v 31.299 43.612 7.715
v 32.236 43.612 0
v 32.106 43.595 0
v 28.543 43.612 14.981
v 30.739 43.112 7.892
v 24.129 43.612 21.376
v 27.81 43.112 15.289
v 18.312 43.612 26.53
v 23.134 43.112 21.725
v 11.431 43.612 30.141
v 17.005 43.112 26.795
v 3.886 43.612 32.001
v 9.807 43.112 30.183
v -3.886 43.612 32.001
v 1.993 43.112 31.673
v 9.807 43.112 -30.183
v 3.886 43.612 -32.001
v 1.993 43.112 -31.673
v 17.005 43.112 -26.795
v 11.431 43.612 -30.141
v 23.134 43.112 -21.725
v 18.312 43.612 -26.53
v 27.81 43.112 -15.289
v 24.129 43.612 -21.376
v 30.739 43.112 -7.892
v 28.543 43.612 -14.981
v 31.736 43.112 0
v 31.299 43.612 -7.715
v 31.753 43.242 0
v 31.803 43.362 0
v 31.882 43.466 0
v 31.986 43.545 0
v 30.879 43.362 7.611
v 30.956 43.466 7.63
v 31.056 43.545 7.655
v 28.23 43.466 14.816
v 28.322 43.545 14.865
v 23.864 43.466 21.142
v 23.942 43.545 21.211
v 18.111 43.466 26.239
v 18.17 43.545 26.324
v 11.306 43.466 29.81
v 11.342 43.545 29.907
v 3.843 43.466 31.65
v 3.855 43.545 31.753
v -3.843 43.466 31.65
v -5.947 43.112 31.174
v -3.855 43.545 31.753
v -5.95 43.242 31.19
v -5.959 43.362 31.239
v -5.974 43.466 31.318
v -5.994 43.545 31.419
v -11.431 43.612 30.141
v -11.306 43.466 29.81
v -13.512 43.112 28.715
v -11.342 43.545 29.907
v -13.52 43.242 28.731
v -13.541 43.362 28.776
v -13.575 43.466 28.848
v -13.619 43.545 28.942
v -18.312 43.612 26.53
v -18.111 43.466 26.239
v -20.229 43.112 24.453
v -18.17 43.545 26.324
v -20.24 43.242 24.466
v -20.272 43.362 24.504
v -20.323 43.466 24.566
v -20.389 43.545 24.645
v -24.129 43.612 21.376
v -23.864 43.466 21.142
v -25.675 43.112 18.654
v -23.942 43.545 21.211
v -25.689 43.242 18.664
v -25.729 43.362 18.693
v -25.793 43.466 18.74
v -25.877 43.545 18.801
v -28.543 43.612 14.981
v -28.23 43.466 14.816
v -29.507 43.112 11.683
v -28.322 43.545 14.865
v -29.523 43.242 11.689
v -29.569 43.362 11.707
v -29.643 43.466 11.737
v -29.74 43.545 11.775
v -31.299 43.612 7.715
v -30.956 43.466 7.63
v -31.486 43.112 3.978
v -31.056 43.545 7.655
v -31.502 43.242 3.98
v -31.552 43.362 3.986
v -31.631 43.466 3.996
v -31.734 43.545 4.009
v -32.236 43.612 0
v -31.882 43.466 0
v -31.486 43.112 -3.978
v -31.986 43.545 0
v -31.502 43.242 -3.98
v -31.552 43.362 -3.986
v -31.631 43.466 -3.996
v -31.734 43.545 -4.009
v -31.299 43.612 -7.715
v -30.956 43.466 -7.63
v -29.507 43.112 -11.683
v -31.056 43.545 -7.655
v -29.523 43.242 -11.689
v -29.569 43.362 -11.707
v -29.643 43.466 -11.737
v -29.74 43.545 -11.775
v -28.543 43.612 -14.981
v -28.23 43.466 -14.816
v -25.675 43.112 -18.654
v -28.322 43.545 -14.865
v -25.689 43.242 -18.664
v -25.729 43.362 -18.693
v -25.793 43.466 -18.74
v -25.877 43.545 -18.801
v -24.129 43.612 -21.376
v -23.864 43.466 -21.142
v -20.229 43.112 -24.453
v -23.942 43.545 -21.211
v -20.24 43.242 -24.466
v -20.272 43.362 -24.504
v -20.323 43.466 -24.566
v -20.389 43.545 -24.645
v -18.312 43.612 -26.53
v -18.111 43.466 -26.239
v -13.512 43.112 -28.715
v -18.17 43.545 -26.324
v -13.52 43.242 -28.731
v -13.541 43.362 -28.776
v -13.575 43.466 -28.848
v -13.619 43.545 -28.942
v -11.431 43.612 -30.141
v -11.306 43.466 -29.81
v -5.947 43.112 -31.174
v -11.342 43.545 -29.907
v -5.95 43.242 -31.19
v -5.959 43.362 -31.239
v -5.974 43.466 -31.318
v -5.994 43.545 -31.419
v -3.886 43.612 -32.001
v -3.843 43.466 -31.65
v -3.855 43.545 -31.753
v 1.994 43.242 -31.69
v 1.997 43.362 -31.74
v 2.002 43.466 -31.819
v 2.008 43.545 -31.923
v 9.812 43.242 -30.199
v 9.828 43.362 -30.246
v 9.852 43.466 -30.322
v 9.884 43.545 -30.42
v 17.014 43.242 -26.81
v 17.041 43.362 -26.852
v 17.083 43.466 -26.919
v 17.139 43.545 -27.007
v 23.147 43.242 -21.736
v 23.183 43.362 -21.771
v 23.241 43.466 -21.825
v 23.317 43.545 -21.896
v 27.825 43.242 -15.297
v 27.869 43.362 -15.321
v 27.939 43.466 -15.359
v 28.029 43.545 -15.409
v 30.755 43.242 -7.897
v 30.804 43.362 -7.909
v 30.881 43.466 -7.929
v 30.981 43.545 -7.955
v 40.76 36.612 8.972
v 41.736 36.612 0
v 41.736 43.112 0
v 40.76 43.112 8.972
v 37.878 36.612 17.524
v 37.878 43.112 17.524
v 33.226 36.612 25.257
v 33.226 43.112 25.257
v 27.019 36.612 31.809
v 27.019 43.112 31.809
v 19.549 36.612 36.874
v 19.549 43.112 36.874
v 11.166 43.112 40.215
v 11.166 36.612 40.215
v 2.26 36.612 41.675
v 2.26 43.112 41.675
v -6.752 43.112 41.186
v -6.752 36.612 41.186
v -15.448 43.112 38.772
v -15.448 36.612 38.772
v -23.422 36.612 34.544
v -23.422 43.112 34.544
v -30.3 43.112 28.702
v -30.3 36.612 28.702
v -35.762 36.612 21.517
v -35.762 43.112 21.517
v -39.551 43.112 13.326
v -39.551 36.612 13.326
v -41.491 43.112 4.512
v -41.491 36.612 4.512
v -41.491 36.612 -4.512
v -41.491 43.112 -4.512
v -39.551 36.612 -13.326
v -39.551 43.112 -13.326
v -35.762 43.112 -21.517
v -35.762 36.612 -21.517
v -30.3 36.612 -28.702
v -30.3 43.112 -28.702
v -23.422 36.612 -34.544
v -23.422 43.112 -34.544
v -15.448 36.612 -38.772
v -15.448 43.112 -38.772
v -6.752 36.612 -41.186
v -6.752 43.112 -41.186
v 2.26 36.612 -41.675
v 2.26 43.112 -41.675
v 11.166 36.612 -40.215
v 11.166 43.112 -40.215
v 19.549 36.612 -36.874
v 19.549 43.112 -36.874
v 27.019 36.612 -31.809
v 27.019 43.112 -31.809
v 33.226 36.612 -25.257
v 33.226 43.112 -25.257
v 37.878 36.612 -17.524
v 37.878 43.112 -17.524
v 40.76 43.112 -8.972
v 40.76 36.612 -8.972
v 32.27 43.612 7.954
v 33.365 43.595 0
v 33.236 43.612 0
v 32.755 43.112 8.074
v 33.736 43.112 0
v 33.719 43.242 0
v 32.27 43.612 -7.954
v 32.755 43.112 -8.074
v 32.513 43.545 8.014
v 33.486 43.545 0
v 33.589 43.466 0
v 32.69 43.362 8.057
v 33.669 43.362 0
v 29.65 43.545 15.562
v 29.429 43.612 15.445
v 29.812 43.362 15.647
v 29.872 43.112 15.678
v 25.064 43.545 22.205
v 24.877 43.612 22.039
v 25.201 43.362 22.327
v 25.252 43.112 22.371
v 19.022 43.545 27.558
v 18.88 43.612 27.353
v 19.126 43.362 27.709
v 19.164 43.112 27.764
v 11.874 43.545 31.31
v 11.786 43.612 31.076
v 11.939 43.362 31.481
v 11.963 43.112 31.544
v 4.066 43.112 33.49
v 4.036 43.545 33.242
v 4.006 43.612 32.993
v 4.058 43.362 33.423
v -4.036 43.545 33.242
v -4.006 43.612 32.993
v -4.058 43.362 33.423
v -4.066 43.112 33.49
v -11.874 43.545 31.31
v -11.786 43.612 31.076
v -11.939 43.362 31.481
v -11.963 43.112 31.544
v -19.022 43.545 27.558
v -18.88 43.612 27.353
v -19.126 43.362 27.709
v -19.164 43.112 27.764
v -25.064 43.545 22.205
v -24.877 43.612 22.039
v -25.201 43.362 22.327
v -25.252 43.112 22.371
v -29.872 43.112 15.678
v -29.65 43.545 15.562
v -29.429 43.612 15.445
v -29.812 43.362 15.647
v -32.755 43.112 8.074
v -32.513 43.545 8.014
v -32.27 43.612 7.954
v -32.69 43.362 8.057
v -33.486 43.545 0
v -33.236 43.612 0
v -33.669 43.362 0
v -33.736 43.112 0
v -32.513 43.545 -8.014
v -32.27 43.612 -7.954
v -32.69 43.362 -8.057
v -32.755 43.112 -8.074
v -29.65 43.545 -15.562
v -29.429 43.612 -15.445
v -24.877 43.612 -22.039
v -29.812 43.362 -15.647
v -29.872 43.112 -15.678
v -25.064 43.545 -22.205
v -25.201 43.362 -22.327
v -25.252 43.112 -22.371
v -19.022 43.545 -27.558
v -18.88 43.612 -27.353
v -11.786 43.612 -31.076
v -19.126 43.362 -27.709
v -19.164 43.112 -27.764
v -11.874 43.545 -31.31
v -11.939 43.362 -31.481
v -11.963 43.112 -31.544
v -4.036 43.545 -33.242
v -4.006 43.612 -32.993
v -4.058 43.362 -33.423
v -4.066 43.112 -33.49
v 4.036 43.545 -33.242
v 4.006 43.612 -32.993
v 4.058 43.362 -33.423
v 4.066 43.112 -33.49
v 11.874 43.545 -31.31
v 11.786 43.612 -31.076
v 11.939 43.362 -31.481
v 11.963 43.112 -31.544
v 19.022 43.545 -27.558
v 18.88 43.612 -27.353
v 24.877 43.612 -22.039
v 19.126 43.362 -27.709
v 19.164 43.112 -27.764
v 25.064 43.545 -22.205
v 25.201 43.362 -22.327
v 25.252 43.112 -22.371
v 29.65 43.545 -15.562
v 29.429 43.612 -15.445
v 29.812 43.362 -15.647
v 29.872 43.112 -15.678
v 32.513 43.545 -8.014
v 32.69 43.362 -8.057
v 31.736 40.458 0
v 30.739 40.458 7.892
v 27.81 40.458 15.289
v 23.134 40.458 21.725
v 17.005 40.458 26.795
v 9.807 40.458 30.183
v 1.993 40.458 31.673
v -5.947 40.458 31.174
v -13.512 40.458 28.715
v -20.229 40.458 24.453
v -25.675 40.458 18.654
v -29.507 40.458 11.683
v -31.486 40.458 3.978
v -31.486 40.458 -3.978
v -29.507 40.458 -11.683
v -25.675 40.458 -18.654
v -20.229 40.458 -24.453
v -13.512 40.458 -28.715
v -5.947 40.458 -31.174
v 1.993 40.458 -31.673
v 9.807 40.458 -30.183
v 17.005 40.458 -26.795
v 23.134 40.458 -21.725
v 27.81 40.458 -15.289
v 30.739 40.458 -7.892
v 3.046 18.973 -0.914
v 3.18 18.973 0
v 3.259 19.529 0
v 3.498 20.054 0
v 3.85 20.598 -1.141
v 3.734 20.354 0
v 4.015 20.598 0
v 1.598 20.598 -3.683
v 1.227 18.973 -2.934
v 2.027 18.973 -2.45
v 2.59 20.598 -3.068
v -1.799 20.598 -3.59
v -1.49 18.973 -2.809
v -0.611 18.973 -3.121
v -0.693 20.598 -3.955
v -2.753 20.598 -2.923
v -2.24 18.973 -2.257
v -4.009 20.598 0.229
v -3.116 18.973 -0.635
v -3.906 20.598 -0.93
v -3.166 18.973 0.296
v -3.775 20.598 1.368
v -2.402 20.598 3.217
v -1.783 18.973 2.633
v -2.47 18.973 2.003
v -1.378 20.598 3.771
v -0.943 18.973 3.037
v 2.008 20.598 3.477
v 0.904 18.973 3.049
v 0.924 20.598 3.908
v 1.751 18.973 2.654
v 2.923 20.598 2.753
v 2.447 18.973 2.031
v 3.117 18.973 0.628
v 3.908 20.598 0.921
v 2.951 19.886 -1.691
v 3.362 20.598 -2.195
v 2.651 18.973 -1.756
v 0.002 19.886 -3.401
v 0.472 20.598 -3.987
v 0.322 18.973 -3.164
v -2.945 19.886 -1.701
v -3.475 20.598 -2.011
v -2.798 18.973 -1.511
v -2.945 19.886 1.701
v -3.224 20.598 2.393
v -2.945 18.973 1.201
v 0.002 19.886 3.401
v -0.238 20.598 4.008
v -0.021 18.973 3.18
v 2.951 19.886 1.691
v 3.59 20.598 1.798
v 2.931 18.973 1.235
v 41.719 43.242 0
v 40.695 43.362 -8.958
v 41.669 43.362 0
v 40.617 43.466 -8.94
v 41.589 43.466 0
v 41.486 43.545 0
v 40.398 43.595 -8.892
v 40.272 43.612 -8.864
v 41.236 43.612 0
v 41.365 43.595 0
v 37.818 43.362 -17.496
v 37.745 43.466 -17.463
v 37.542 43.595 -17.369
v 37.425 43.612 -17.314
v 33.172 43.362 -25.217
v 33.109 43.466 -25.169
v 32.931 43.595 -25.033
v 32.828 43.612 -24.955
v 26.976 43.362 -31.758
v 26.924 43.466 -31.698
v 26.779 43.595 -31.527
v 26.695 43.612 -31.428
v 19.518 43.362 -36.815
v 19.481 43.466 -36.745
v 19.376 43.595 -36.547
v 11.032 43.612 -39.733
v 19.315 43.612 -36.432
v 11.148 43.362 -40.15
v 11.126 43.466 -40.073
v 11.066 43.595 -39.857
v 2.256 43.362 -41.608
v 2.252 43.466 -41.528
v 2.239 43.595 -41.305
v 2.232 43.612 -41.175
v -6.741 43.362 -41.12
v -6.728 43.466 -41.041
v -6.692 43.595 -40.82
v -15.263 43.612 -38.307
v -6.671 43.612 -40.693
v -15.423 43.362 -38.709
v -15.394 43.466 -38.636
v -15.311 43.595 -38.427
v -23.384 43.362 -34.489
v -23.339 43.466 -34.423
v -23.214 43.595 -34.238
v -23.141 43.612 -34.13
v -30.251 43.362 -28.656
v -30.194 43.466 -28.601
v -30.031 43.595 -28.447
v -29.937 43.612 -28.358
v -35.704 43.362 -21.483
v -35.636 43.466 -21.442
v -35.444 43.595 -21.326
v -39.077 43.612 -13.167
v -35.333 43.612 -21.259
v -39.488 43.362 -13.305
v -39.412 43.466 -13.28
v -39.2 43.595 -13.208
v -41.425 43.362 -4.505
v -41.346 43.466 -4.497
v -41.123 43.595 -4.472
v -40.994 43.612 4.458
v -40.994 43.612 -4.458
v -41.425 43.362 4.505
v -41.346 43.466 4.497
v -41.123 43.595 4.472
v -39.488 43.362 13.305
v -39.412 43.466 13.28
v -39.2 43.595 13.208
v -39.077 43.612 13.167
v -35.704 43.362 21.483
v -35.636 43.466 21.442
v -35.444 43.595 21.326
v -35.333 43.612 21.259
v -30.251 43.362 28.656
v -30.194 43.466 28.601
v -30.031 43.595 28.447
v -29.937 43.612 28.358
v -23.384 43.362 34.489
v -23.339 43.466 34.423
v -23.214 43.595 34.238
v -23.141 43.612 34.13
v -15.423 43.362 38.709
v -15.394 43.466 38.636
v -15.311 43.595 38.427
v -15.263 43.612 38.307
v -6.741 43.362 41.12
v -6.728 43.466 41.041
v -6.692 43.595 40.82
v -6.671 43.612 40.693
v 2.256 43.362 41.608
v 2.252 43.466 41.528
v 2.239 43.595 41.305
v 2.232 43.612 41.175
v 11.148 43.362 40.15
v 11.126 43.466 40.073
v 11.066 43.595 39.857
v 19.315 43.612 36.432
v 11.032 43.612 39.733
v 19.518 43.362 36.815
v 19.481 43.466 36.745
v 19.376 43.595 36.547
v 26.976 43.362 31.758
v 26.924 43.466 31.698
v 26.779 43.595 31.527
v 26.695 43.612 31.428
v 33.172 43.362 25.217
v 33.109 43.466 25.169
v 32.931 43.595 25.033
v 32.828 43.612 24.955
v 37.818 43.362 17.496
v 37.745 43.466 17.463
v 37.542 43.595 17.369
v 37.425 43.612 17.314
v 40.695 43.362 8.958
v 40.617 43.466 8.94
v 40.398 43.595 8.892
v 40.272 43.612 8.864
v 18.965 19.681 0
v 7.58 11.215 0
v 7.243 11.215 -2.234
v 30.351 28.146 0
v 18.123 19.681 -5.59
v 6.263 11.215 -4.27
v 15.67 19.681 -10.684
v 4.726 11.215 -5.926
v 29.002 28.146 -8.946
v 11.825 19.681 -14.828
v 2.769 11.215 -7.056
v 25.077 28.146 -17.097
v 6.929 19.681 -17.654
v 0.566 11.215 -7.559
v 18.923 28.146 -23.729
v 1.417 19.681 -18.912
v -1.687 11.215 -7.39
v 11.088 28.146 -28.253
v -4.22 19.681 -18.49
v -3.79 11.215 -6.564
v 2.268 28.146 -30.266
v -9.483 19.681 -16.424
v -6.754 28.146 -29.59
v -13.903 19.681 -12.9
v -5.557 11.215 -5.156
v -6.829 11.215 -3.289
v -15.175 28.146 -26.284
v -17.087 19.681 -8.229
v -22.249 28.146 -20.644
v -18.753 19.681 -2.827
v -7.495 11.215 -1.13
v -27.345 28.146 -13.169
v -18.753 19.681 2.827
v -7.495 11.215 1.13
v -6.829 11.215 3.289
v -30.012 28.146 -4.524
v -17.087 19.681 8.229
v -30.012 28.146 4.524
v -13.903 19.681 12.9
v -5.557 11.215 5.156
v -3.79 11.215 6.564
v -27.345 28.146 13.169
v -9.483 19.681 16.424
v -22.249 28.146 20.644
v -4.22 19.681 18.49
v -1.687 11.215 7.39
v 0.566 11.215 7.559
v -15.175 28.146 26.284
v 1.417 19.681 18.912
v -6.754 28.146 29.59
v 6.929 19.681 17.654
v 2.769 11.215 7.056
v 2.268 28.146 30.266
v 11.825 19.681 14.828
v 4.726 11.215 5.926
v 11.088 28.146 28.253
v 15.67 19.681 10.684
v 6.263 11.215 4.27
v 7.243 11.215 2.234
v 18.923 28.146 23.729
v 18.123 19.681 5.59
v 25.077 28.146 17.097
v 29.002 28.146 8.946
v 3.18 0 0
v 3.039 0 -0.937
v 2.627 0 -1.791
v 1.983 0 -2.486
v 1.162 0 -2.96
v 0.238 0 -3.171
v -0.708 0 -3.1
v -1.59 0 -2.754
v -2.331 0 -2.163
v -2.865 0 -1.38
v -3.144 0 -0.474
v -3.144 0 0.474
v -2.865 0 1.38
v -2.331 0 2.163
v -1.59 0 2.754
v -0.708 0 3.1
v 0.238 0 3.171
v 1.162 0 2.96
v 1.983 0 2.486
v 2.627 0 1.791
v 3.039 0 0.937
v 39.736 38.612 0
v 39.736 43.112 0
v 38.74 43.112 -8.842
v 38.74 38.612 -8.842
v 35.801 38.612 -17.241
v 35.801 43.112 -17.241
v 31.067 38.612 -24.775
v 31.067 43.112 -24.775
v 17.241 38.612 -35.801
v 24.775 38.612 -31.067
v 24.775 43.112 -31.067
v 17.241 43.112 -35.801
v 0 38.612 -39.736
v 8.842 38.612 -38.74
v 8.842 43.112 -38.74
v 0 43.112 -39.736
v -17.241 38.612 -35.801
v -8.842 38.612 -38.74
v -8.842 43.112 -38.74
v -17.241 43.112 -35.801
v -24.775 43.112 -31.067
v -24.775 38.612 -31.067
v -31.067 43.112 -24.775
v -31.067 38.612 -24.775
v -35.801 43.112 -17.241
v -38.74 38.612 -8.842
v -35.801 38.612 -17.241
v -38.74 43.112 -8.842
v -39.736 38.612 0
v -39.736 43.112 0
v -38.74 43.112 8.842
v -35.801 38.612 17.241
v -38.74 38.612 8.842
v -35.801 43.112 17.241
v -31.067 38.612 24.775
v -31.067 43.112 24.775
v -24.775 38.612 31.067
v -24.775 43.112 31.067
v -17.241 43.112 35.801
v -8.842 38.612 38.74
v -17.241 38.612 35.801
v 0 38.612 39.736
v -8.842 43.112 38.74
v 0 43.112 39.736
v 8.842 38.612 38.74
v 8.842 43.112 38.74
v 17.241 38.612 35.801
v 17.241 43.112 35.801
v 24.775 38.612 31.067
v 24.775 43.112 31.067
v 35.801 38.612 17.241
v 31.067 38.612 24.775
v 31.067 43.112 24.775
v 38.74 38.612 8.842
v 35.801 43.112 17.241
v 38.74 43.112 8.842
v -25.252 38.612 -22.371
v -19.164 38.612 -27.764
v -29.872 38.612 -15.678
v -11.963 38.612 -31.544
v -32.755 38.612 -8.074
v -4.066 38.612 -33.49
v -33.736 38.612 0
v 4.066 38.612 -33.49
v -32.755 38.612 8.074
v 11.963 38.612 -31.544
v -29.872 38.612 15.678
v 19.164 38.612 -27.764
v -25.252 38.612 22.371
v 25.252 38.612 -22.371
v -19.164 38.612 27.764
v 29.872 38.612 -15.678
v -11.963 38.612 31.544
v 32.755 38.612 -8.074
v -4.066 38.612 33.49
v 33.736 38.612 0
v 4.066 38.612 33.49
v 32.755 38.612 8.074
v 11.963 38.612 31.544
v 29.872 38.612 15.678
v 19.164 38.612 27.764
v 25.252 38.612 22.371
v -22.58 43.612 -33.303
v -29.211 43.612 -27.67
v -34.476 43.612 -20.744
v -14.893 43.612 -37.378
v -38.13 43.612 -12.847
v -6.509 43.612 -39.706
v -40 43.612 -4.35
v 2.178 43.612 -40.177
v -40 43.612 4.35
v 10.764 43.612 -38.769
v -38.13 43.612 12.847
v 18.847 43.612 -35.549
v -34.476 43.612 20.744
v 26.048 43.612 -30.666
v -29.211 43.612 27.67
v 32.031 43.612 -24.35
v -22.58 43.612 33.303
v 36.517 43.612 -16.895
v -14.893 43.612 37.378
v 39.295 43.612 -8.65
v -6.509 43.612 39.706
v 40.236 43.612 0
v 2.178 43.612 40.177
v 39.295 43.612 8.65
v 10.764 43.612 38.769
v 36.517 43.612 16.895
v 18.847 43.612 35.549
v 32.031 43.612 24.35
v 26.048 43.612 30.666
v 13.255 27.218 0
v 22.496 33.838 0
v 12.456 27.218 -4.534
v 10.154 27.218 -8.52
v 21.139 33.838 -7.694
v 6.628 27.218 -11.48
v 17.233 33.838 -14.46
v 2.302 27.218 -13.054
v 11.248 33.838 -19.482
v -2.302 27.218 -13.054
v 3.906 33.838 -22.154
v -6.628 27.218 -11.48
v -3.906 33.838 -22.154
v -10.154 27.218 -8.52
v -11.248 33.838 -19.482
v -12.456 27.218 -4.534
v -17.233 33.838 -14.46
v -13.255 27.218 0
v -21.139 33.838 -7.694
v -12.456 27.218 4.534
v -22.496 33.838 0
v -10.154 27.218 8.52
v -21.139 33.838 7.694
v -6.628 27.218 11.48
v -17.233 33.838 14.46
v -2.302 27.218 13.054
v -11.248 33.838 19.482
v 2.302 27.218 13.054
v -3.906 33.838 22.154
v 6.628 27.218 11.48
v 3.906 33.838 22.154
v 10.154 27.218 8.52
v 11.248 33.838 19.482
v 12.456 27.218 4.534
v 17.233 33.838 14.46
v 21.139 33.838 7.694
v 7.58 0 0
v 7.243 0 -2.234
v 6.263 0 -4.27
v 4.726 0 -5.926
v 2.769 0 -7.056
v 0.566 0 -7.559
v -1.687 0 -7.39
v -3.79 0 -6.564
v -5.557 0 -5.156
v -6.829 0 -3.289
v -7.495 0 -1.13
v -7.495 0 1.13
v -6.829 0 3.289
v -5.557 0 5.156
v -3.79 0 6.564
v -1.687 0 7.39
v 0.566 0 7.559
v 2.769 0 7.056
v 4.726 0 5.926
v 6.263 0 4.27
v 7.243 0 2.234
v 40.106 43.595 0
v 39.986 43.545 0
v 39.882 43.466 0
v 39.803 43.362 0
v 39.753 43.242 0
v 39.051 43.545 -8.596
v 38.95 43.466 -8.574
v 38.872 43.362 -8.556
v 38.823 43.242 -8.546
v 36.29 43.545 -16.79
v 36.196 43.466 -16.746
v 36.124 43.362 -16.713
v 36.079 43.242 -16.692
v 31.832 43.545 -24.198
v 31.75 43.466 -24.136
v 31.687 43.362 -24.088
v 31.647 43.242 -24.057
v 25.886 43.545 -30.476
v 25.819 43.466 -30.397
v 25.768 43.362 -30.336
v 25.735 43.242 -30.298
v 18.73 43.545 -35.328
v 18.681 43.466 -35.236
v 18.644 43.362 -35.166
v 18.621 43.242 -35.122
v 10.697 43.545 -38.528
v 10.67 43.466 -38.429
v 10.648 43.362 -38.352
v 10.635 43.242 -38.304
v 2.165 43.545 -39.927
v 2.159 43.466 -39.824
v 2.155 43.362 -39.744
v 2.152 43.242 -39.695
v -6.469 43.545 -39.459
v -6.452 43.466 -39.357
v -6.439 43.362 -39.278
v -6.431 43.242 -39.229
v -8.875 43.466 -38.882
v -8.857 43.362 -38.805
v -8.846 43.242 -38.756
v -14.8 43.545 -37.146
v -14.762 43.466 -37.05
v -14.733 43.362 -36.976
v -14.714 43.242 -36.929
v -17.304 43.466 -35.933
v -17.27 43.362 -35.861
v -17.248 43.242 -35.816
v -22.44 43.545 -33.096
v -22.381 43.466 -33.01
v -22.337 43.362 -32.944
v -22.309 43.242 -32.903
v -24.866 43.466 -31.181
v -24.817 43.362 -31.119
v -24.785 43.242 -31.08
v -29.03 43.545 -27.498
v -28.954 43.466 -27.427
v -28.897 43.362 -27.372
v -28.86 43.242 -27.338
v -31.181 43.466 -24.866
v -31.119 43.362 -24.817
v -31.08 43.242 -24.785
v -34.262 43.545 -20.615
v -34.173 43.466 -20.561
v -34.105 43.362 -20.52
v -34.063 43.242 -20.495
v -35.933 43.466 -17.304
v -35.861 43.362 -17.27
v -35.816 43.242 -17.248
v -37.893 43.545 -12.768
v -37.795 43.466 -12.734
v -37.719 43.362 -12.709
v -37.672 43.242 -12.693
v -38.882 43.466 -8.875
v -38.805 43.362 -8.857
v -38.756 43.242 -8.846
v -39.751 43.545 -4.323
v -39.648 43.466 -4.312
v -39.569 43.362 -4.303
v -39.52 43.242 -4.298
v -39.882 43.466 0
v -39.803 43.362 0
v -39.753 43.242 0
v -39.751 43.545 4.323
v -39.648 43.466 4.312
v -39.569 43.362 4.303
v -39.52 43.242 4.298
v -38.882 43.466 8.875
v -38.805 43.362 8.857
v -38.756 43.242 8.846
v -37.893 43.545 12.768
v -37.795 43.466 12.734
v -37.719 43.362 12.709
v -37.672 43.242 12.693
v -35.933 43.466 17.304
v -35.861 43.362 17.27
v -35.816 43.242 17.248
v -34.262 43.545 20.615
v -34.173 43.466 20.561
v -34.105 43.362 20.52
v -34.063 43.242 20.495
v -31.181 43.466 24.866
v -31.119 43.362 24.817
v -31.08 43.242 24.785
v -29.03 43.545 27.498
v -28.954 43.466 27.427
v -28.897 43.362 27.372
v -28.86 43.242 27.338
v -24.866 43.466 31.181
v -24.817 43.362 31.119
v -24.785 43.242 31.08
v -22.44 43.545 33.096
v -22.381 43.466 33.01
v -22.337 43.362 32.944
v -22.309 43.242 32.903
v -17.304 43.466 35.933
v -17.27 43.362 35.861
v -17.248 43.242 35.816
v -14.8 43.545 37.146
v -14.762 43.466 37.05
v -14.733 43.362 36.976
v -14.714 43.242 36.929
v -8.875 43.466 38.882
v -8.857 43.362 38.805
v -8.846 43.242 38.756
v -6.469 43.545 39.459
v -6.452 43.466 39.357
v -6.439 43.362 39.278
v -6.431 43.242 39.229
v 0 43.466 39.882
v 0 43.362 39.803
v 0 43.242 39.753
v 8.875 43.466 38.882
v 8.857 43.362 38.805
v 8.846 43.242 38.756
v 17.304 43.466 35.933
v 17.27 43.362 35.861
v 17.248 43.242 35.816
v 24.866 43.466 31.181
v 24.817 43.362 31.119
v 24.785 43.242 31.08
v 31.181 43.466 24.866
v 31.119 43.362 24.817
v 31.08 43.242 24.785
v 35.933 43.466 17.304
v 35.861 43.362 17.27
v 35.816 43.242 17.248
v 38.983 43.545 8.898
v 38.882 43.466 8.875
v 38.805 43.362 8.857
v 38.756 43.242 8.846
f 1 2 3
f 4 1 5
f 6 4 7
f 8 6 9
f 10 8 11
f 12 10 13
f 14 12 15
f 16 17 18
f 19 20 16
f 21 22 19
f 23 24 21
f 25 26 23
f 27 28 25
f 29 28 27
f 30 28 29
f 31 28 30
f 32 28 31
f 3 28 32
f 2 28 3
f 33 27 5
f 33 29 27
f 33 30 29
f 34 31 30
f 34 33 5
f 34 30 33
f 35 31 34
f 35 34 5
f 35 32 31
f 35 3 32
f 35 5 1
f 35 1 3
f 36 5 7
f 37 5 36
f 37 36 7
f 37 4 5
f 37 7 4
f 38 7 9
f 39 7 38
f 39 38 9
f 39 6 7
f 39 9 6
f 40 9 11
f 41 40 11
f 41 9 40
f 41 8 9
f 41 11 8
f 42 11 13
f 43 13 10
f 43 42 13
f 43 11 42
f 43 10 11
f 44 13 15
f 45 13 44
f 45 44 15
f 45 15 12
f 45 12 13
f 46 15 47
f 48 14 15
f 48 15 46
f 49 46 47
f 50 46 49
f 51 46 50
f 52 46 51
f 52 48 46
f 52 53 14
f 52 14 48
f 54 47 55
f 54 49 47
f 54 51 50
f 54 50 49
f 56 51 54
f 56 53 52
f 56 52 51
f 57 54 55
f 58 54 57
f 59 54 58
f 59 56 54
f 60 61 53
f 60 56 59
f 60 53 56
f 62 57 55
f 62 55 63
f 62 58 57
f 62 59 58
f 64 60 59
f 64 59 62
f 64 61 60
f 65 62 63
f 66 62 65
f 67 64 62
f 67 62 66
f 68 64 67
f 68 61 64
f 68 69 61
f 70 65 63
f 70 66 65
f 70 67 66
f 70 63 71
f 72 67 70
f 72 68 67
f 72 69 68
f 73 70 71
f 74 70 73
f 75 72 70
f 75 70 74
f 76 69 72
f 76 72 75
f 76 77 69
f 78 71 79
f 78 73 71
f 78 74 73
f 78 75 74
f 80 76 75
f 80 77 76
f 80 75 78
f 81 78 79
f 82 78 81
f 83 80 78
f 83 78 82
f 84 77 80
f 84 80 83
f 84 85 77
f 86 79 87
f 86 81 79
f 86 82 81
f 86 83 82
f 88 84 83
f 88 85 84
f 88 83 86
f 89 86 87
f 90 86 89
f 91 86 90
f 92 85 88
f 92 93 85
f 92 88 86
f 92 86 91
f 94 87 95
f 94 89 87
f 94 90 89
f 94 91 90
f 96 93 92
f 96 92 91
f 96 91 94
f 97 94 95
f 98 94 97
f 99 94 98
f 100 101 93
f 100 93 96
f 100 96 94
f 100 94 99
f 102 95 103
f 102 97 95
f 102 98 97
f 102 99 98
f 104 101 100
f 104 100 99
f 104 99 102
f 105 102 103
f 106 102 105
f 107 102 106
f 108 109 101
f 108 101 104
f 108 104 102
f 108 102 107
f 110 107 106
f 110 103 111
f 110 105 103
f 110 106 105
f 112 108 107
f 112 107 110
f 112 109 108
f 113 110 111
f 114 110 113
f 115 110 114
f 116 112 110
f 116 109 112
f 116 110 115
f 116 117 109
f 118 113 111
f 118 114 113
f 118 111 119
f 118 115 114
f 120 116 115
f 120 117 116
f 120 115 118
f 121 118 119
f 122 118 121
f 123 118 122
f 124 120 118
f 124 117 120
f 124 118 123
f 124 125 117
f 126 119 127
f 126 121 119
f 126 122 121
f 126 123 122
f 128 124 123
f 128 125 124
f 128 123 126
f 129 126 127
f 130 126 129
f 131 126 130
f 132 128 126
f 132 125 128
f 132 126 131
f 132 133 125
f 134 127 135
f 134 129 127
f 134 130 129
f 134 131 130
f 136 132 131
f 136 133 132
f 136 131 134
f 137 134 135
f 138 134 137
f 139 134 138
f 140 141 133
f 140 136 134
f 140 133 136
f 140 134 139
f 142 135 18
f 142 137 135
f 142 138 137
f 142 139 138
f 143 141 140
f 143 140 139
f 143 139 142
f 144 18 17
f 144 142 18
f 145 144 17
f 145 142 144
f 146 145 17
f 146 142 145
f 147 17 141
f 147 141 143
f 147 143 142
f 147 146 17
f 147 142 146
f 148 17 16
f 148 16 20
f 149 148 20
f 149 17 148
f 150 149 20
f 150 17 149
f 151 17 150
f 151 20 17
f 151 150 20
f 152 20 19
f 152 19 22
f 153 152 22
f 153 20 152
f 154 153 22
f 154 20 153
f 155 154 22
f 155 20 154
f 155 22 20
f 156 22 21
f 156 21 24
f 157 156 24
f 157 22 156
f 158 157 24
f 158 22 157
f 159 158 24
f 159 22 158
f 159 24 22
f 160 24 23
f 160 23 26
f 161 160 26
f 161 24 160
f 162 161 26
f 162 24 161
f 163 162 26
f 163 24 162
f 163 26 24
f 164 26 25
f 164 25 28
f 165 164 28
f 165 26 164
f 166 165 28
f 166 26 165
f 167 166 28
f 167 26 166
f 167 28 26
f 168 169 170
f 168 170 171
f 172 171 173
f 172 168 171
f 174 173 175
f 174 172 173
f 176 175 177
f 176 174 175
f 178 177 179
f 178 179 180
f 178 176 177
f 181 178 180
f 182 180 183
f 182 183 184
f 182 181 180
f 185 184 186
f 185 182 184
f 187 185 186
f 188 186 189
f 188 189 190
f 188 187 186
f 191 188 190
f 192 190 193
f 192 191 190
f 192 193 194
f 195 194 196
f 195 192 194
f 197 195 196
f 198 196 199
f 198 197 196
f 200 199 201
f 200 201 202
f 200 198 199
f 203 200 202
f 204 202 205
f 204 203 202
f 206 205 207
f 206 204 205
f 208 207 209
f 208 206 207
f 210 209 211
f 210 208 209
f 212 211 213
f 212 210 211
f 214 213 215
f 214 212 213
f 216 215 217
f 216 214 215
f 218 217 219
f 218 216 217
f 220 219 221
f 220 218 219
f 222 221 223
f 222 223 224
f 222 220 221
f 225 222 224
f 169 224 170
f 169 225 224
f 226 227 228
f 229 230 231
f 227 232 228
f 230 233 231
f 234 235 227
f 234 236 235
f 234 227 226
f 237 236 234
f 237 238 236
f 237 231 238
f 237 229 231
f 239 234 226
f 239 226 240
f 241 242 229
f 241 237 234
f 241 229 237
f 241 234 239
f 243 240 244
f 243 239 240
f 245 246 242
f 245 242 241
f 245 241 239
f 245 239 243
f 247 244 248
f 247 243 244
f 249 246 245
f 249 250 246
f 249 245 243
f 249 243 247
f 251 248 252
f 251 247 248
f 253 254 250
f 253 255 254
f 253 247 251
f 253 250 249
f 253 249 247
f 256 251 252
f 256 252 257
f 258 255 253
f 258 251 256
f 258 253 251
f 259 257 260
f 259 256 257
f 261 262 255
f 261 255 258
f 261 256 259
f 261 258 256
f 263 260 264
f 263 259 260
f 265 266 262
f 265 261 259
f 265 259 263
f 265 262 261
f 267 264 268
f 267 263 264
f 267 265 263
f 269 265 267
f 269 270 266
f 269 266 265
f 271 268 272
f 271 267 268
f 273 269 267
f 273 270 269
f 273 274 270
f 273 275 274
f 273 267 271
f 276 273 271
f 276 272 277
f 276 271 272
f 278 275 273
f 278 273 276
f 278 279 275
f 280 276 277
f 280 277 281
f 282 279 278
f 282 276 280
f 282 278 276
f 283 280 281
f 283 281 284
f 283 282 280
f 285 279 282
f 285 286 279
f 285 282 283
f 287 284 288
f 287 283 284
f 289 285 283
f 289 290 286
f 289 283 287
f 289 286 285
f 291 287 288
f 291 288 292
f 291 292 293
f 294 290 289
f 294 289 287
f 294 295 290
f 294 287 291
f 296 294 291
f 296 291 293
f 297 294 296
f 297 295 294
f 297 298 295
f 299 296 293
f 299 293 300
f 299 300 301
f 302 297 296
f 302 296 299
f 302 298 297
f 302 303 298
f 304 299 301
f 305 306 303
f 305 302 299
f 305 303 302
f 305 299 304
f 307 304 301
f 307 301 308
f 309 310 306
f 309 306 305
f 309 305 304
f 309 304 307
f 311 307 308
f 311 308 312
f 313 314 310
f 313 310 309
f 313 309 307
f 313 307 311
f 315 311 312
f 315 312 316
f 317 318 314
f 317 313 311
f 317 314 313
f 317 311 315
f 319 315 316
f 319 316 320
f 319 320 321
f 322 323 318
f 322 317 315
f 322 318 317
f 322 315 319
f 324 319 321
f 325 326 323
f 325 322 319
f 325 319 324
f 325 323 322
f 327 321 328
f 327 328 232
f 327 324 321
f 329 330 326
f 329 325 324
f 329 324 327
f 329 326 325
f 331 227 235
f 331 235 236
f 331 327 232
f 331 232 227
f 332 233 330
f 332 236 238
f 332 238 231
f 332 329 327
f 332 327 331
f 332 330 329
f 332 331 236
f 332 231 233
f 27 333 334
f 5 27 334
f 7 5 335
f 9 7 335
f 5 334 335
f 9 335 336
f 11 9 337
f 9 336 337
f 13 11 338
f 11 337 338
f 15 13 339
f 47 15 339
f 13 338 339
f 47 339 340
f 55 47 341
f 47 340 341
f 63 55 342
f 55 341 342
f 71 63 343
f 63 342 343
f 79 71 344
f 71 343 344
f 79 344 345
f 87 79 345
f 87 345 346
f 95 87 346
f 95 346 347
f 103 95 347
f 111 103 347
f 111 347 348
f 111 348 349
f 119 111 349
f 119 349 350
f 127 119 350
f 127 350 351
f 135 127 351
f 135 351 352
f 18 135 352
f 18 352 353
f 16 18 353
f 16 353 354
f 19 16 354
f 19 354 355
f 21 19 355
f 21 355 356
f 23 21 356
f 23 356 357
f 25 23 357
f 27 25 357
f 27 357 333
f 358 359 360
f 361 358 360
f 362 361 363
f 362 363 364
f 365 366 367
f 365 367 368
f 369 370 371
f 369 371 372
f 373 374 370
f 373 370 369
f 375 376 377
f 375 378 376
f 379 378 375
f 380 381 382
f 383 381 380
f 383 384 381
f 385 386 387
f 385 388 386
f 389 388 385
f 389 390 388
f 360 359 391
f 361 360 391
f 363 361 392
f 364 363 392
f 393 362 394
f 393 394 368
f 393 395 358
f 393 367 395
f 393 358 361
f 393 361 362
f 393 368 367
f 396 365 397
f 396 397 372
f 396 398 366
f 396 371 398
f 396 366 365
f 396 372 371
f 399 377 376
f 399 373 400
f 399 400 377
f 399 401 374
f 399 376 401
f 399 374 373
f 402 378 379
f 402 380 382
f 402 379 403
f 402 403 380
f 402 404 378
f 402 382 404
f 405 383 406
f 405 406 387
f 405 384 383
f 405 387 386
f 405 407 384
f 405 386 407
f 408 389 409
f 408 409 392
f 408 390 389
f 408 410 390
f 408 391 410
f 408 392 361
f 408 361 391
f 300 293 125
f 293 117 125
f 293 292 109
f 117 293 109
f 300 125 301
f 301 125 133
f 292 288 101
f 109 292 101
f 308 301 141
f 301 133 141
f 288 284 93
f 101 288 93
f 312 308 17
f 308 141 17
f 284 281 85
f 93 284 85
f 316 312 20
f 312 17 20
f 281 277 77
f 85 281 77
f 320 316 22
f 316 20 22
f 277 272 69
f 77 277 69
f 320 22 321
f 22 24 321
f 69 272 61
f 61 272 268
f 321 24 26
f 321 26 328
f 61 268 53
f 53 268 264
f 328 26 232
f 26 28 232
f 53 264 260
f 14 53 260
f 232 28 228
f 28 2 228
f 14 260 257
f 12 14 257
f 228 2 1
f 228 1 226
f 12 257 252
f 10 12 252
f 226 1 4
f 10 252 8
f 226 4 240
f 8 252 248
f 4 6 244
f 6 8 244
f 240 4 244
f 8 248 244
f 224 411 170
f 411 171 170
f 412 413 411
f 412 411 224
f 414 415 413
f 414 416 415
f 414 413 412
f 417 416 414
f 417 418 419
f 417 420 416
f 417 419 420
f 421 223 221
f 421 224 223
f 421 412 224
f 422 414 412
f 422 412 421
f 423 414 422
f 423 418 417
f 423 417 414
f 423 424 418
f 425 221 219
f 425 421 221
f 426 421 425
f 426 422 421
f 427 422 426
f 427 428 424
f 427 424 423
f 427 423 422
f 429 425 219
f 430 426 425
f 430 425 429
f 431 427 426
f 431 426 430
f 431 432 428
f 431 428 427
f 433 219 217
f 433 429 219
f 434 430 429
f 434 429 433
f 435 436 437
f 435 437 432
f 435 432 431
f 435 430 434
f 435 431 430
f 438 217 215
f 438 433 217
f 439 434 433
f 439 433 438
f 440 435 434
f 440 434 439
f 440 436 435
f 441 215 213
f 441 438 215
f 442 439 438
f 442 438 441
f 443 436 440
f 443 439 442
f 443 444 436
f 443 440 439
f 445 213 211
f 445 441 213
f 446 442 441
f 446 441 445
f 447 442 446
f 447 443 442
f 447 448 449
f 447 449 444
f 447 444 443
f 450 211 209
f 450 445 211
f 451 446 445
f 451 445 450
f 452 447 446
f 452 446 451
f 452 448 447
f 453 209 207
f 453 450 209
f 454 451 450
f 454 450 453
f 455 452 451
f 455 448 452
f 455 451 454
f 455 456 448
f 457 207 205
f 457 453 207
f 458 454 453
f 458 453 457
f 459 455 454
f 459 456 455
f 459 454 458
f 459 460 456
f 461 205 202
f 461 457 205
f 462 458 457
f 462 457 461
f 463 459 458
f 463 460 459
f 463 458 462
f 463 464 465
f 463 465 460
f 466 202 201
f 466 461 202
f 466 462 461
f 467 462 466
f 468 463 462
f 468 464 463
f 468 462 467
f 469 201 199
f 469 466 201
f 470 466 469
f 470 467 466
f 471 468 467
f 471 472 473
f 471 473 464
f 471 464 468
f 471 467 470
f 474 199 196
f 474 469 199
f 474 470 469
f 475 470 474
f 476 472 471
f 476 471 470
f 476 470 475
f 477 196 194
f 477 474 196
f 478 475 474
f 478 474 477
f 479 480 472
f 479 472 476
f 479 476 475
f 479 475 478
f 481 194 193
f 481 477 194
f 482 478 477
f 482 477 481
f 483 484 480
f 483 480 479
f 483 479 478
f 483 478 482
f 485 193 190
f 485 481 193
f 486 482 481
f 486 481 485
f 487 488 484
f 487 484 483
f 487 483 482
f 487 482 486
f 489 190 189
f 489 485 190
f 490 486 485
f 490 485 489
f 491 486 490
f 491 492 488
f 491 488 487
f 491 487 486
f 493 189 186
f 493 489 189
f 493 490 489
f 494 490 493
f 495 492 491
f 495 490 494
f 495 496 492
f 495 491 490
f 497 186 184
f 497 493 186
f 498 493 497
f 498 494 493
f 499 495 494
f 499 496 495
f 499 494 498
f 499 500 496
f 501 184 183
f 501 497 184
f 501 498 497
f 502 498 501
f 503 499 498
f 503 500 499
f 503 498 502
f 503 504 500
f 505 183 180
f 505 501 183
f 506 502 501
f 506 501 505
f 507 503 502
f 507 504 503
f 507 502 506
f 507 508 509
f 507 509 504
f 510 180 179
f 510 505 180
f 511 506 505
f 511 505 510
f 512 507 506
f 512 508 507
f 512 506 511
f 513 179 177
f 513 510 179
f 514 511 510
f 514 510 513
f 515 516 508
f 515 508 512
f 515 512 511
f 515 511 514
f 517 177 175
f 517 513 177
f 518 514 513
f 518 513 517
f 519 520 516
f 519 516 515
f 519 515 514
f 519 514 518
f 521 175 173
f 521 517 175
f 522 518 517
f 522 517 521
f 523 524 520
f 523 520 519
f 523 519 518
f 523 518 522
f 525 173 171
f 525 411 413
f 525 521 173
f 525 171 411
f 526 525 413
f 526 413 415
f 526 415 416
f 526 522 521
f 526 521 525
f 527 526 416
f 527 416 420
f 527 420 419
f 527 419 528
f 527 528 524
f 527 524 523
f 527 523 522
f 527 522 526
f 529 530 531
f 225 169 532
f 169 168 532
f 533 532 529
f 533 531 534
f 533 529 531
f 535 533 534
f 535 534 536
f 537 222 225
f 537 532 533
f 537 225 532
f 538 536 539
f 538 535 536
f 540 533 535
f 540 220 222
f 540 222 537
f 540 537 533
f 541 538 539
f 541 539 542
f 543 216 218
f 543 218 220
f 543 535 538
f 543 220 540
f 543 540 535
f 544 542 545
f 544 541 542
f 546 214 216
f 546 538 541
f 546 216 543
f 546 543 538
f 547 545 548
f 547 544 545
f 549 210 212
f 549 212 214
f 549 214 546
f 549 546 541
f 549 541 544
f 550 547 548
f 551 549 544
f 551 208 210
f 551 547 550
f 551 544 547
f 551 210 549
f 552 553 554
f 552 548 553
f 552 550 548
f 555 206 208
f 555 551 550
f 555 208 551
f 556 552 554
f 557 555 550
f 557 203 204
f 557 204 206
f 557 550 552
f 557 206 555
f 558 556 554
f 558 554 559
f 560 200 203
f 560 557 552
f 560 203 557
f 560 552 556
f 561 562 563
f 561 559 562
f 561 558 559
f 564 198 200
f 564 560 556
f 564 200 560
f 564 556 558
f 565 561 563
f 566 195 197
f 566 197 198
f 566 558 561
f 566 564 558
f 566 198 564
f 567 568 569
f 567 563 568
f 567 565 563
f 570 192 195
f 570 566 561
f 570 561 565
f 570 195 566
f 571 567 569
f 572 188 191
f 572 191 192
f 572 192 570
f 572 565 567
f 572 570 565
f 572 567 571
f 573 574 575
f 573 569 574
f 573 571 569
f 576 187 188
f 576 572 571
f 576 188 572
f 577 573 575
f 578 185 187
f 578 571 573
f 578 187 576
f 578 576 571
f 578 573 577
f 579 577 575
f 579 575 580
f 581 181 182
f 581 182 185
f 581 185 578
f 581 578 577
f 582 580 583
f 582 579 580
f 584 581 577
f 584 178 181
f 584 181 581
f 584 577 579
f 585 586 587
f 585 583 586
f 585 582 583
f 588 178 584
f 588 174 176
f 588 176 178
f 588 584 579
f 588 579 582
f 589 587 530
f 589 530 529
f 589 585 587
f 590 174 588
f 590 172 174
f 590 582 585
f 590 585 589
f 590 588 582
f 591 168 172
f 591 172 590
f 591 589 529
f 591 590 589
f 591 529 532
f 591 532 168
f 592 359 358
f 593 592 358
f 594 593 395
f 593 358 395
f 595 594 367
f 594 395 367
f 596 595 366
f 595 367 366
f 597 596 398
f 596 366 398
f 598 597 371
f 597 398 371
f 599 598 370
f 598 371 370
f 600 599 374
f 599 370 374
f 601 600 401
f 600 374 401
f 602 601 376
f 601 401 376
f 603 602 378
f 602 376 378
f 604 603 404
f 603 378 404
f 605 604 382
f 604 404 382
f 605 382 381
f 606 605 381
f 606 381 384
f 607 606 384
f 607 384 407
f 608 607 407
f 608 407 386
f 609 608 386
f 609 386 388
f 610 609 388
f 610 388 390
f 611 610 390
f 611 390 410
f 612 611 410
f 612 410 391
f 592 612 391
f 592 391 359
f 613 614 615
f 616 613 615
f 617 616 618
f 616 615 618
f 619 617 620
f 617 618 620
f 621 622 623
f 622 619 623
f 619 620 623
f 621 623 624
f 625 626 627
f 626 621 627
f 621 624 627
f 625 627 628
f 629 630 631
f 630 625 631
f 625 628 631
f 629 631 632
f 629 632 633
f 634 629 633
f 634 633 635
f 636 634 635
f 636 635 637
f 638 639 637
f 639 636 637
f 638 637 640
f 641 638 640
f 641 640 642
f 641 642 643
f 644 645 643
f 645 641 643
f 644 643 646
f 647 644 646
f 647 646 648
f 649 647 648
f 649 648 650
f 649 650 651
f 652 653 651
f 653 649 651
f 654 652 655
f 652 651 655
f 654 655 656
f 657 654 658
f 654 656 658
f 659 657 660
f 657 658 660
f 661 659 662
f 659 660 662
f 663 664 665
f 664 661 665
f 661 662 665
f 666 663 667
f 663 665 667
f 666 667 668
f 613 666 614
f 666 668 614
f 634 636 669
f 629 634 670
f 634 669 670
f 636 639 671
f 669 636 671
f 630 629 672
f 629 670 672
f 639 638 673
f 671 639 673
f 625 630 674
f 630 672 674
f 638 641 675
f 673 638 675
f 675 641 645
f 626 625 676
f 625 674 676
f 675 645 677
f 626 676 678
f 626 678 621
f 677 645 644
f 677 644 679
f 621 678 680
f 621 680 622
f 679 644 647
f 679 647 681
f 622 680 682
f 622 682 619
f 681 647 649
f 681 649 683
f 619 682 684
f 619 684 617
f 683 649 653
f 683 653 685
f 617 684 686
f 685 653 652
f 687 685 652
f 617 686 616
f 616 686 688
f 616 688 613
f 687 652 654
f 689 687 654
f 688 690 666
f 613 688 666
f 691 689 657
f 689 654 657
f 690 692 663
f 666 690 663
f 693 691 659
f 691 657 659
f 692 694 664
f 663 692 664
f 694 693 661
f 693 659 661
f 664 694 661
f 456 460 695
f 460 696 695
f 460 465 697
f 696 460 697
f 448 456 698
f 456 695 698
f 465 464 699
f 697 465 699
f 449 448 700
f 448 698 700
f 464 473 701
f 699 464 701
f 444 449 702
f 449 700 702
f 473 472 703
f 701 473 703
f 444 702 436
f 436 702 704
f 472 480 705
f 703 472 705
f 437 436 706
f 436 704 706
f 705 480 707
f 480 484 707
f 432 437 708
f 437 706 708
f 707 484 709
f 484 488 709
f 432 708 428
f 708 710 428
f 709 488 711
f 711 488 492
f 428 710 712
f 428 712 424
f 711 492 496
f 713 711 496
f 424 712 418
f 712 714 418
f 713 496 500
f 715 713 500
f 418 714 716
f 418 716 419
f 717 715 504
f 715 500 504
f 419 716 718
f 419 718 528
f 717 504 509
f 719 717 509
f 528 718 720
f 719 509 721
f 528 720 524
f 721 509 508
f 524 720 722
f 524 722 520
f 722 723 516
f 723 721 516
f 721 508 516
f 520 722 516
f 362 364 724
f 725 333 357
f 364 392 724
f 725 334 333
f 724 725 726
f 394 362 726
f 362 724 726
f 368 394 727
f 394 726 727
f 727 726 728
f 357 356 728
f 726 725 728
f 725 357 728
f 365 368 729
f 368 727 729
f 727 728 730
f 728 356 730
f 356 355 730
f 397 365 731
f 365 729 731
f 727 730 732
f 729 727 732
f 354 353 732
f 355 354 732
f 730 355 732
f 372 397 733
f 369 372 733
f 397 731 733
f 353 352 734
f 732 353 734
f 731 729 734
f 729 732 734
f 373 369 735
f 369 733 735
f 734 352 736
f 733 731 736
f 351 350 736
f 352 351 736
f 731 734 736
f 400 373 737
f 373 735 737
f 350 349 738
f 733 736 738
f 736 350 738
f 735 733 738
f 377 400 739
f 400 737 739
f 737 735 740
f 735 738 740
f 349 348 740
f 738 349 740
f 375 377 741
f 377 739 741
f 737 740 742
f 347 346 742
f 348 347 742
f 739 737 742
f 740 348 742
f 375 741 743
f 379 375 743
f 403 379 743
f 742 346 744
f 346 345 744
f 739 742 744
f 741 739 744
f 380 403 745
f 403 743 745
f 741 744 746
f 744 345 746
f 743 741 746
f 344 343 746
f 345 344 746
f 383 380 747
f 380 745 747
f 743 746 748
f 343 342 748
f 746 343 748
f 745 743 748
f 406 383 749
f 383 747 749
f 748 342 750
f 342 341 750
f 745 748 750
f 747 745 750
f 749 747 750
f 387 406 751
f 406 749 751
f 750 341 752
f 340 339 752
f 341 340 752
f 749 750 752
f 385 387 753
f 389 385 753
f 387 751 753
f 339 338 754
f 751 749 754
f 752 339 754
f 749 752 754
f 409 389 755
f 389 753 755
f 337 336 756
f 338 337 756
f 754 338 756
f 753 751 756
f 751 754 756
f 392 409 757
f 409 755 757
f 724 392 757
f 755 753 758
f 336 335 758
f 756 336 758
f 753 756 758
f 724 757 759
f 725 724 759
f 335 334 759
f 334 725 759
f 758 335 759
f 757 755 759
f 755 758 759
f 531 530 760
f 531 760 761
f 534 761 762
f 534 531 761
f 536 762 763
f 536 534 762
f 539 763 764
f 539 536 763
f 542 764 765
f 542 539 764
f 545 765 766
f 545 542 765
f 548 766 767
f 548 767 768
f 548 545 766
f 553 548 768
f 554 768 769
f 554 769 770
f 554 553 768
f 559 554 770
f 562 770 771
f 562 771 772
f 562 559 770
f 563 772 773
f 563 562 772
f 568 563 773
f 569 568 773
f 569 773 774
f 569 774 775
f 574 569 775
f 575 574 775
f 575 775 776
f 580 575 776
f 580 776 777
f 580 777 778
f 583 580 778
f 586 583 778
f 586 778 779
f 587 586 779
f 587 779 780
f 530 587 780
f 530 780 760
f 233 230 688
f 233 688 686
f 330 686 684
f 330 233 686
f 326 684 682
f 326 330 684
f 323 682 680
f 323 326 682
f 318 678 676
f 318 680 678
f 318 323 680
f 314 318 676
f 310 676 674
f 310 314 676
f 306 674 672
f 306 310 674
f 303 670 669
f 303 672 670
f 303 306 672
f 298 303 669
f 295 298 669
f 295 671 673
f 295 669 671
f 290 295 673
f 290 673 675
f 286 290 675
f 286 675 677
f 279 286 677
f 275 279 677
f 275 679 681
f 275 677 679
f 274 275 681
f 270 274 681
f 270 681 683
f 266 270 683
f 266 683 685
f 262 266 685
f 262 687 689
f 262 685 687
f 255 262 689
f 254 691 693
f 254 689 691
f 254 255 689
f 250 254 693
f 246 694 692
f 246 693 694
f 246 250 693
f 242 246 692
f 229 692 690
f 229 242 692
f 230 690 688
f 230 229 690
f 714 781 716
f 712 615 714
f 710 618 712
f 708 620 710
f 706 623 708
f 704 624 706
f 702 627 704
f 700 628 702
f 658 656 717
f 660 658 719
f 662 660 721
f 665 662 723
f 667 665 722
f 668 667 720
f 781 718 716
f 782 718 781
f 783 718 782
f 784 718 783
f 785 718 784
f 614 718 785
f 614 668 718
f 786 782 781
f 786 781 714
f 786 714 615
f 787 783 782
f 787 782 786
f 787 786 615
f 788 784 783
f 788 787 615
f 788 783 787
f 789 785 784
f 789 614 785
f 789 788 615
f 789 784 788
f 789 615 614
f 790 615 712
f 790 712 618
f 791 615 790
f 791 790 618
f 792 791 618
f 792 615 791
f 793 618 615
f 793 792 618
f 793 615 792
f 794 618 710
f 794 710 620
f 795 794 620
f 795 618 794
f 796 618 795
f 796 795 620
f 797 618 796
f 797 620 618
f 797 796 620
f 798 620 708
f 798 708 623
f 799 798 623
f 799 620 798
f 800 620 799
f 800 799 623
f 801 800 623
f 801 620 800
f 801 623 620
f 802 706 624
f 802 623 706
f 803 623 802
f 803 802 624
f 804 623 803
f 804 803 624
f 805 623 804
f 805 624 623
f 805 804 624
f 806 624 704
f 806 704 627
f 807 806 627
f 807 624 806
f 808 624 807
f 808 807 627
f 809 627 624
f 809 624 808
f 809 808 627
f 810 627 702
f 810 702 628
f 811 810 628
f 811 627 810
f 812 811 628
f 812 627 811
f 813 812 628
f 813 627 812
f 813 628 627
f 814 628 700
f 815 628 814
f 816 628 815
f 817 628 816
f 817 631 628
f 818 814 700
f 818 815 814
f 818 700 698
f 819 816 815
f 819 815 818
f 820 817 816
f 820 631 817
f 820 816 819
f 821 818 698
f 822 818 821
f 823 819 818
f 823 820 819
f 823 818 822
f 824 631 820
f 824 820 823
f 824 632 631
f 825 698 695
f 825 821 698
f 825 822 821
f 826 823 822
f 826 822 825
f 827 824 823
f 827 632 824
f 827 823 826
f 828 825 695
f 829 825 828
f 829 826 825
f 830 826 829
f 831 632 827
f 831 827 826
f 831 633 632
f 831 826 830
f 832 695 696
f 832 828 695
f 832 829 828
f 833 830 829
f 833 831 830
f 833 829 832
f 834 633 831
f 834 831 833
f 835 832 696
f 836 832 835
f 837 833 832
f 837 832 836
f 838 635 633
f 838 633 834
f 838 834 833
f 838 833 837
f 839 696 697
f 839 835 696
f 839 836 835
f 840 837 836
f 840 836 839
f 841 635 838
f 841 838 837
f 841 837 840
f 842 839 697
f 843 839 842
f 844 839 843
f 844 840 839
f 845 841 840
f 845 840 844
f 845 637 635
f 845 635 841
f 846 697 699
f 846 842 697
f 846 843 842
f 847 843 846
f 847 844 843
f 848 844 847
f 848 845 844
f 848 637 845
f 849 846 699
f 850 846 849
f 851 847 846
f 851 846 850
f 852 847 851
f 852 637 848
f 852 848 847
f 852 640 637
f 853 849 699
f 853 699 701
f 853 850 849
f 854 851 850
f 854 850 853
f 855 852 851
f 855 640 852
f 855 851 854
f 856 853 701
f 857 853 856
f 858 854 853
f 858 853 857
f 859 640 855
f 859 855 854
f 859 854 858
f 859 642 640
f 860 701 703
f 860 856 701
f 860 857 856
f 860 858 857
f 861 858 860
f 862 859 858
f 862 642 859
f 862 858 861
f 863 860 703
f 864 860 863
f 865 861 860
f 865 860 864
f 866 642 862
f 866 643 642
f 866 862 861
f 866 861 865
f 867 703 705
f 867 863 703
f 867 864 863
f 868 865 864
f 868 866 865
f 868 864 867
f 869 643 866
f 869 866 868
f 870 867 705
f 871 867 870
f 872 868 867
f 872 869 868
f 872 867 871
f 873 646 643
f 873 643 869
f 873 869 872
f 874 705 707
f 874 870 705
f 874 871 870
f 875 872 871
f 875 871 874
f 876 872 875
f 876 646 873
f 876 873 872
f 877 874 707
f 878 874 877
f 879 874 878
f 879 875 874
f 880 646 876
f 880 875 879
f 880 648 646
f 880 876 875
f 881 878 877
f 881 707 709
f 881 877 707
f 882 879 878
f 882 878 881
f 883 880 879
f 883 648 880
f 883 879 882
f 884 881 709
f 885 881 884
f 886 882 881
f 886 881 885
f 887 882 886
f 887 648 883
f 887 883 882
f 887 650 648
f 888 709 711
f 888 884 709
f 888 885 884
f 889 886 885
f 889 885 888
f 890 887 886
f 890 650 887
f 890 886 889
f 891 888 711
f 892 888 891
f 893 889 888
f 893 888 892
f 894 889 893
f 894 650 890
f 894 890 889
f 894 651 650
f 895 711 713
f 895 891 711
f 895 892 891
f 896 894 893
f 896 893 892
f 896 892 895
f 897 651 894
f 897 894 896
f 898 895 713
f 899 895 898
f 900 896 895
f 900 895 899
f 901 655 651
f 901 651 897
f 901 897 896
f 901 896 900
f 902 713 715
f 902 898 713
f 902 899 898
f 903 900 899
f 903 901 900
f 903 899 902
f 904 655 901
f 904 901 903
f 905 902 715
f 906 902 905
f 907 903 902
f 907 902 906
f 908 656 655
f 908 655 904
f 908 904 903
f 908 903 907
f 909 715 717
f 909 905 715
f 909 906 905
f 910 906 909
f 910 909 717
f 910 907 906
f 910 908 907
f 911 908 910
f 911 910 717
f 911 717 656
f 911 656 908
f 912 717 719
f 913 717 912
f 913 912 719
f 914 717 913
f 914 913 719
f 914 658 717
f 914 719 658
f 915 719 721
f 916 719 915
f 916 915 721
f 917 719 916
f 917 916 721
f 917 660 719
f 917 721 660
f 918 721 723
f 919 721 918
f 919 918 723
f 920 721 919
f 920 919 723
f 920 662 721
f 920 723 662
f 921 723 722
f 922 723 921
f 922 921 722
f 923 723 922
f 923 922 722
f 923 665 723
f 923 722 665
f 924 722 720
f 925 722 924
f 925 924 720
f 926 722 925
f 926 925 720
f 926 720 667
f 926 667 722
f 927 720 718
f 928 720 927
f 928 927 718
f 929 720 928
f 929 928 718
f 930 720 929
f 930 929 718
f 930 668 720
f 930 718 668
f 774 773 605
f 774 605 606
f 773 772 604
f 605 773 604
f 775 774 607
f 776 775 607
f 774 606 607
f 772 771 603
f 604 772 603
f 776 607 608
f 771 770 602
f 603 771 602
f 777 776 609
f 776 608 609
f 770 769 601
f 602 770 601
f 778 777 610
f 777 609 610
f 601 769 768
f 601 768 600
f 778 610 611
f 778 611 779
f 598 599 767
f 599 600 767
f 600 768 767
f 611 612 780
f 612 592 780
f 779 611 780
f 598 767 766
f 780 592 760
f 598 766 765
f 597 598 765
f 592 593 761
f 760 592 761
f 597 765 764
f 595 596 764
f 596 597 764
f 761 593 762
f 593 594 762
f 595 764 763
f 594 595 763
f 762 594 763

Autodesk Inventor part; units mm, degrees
ref_plane "YZ Plane" through (0, 0, 0) normal (1, 0, 0) x (0, 1, 0)
ref_plane "XZ Plane" through (0, 0, 0) normal (0, 1, 0) x (-1, 0, 0)
ref_plane "XY Plane" through (0, 0, 0) normal (0, 0, 1) x (1, 0, 0)
sketch "Sketch1" plane through (0, 0, 0) normal (0, 0, 1) x (1, 0, 0)
  line L0 (0, -91.8925) -> (0, 152.1979) construction
  line L1 (3.18, 0) -> (7.58, 0)
  line L2 (7.58, 0) -> (7.58, 20)
  line L3 (7.58, 20) -> (3.18, 20)
  line L4 (3.18, 0) -> (3.18, 20)
  point P0 (0, 0)
  dimension "d1" = 3.18
  dimension "d2" = 20
  dimension "d17" = 4.4
  dimension "d18" = 7.58
revolve "Revolution1" add sketch "Sketch1" angle 360 about axis through (0, -91.8925, 0) along (0, 1, 0)
sketch "Sketch2" plane through (0, 0, 0) normal (0, 0, 1) x (1, 0, 0)
  line L0 (3.18, 0) -> (3.18, 20) projected
  line L1 (-7.58, 20) -> (7.58, 20) construction
  line L2 (7.58, 20) -> (42.58, 20) construction
  line L3 (7.58, 20) -> (7.58, 0) projected
  line L4 (38.7358, 38.6122) -> (39.7358, 38.6122)
  line L5 (38.7358, 38.6122) -> (33.7358, 38.6122)
  line L6 (39.7358, 38.6122) -> (39.7358, 43.6122)
  line L7 (33.7358, 38.6122) -> (33.7358, 43.6122)
  line L8 (39.7358, 43.6122) -> (41.7358, 43.6122)
  line L9 (41.7358, 43.6122) -> (41.7358, 36.6122)
  line L10 (41.7358, 36.6122) -> (7.58, 11.215)
  line L11 (33.7358, 43.6122) -> (31.7358, 43.6122)
  line L12 (3.18, 20) -> (7.58, 20)
  line L13 (7.58, 11.215) -> (7.58, 20)
  line L14 (0, 30.8602) -> (0, -63.1044)
  line L15 (31.7358, 43.6122) -> (31.7358, 40.4576)
  line L16 (31.7358, 40.4576) -> (3.18, 20)
  point P0 (0, 0)
  dimension "d6" = 35
  dimension "d7" = 1
  dimension "d8" = 5
  dimension "d9" = 5
  dimension "d10" = 5
  dimension "d11" = 2
  dimension "d12" = 7
  dimension "d13" = 2
revolve "Revolution2" add sketch "Sketch2" angle 360 about axis through (0, 30.8602, 0) along (0, -1, 0)
fillet "Fillet1" radius 2 1 edges at (-3.18, 20, 0)
fillet "Fillet2" radius 0.5 4 edges at (-31.7358, 43.6122, 0) (-33.7358, 43.6122, 0) (-39.7358, 43.6122, 0) (-41.7358, 43.6122, 0)
properties part number "Drain Funnel v0.6.2"
